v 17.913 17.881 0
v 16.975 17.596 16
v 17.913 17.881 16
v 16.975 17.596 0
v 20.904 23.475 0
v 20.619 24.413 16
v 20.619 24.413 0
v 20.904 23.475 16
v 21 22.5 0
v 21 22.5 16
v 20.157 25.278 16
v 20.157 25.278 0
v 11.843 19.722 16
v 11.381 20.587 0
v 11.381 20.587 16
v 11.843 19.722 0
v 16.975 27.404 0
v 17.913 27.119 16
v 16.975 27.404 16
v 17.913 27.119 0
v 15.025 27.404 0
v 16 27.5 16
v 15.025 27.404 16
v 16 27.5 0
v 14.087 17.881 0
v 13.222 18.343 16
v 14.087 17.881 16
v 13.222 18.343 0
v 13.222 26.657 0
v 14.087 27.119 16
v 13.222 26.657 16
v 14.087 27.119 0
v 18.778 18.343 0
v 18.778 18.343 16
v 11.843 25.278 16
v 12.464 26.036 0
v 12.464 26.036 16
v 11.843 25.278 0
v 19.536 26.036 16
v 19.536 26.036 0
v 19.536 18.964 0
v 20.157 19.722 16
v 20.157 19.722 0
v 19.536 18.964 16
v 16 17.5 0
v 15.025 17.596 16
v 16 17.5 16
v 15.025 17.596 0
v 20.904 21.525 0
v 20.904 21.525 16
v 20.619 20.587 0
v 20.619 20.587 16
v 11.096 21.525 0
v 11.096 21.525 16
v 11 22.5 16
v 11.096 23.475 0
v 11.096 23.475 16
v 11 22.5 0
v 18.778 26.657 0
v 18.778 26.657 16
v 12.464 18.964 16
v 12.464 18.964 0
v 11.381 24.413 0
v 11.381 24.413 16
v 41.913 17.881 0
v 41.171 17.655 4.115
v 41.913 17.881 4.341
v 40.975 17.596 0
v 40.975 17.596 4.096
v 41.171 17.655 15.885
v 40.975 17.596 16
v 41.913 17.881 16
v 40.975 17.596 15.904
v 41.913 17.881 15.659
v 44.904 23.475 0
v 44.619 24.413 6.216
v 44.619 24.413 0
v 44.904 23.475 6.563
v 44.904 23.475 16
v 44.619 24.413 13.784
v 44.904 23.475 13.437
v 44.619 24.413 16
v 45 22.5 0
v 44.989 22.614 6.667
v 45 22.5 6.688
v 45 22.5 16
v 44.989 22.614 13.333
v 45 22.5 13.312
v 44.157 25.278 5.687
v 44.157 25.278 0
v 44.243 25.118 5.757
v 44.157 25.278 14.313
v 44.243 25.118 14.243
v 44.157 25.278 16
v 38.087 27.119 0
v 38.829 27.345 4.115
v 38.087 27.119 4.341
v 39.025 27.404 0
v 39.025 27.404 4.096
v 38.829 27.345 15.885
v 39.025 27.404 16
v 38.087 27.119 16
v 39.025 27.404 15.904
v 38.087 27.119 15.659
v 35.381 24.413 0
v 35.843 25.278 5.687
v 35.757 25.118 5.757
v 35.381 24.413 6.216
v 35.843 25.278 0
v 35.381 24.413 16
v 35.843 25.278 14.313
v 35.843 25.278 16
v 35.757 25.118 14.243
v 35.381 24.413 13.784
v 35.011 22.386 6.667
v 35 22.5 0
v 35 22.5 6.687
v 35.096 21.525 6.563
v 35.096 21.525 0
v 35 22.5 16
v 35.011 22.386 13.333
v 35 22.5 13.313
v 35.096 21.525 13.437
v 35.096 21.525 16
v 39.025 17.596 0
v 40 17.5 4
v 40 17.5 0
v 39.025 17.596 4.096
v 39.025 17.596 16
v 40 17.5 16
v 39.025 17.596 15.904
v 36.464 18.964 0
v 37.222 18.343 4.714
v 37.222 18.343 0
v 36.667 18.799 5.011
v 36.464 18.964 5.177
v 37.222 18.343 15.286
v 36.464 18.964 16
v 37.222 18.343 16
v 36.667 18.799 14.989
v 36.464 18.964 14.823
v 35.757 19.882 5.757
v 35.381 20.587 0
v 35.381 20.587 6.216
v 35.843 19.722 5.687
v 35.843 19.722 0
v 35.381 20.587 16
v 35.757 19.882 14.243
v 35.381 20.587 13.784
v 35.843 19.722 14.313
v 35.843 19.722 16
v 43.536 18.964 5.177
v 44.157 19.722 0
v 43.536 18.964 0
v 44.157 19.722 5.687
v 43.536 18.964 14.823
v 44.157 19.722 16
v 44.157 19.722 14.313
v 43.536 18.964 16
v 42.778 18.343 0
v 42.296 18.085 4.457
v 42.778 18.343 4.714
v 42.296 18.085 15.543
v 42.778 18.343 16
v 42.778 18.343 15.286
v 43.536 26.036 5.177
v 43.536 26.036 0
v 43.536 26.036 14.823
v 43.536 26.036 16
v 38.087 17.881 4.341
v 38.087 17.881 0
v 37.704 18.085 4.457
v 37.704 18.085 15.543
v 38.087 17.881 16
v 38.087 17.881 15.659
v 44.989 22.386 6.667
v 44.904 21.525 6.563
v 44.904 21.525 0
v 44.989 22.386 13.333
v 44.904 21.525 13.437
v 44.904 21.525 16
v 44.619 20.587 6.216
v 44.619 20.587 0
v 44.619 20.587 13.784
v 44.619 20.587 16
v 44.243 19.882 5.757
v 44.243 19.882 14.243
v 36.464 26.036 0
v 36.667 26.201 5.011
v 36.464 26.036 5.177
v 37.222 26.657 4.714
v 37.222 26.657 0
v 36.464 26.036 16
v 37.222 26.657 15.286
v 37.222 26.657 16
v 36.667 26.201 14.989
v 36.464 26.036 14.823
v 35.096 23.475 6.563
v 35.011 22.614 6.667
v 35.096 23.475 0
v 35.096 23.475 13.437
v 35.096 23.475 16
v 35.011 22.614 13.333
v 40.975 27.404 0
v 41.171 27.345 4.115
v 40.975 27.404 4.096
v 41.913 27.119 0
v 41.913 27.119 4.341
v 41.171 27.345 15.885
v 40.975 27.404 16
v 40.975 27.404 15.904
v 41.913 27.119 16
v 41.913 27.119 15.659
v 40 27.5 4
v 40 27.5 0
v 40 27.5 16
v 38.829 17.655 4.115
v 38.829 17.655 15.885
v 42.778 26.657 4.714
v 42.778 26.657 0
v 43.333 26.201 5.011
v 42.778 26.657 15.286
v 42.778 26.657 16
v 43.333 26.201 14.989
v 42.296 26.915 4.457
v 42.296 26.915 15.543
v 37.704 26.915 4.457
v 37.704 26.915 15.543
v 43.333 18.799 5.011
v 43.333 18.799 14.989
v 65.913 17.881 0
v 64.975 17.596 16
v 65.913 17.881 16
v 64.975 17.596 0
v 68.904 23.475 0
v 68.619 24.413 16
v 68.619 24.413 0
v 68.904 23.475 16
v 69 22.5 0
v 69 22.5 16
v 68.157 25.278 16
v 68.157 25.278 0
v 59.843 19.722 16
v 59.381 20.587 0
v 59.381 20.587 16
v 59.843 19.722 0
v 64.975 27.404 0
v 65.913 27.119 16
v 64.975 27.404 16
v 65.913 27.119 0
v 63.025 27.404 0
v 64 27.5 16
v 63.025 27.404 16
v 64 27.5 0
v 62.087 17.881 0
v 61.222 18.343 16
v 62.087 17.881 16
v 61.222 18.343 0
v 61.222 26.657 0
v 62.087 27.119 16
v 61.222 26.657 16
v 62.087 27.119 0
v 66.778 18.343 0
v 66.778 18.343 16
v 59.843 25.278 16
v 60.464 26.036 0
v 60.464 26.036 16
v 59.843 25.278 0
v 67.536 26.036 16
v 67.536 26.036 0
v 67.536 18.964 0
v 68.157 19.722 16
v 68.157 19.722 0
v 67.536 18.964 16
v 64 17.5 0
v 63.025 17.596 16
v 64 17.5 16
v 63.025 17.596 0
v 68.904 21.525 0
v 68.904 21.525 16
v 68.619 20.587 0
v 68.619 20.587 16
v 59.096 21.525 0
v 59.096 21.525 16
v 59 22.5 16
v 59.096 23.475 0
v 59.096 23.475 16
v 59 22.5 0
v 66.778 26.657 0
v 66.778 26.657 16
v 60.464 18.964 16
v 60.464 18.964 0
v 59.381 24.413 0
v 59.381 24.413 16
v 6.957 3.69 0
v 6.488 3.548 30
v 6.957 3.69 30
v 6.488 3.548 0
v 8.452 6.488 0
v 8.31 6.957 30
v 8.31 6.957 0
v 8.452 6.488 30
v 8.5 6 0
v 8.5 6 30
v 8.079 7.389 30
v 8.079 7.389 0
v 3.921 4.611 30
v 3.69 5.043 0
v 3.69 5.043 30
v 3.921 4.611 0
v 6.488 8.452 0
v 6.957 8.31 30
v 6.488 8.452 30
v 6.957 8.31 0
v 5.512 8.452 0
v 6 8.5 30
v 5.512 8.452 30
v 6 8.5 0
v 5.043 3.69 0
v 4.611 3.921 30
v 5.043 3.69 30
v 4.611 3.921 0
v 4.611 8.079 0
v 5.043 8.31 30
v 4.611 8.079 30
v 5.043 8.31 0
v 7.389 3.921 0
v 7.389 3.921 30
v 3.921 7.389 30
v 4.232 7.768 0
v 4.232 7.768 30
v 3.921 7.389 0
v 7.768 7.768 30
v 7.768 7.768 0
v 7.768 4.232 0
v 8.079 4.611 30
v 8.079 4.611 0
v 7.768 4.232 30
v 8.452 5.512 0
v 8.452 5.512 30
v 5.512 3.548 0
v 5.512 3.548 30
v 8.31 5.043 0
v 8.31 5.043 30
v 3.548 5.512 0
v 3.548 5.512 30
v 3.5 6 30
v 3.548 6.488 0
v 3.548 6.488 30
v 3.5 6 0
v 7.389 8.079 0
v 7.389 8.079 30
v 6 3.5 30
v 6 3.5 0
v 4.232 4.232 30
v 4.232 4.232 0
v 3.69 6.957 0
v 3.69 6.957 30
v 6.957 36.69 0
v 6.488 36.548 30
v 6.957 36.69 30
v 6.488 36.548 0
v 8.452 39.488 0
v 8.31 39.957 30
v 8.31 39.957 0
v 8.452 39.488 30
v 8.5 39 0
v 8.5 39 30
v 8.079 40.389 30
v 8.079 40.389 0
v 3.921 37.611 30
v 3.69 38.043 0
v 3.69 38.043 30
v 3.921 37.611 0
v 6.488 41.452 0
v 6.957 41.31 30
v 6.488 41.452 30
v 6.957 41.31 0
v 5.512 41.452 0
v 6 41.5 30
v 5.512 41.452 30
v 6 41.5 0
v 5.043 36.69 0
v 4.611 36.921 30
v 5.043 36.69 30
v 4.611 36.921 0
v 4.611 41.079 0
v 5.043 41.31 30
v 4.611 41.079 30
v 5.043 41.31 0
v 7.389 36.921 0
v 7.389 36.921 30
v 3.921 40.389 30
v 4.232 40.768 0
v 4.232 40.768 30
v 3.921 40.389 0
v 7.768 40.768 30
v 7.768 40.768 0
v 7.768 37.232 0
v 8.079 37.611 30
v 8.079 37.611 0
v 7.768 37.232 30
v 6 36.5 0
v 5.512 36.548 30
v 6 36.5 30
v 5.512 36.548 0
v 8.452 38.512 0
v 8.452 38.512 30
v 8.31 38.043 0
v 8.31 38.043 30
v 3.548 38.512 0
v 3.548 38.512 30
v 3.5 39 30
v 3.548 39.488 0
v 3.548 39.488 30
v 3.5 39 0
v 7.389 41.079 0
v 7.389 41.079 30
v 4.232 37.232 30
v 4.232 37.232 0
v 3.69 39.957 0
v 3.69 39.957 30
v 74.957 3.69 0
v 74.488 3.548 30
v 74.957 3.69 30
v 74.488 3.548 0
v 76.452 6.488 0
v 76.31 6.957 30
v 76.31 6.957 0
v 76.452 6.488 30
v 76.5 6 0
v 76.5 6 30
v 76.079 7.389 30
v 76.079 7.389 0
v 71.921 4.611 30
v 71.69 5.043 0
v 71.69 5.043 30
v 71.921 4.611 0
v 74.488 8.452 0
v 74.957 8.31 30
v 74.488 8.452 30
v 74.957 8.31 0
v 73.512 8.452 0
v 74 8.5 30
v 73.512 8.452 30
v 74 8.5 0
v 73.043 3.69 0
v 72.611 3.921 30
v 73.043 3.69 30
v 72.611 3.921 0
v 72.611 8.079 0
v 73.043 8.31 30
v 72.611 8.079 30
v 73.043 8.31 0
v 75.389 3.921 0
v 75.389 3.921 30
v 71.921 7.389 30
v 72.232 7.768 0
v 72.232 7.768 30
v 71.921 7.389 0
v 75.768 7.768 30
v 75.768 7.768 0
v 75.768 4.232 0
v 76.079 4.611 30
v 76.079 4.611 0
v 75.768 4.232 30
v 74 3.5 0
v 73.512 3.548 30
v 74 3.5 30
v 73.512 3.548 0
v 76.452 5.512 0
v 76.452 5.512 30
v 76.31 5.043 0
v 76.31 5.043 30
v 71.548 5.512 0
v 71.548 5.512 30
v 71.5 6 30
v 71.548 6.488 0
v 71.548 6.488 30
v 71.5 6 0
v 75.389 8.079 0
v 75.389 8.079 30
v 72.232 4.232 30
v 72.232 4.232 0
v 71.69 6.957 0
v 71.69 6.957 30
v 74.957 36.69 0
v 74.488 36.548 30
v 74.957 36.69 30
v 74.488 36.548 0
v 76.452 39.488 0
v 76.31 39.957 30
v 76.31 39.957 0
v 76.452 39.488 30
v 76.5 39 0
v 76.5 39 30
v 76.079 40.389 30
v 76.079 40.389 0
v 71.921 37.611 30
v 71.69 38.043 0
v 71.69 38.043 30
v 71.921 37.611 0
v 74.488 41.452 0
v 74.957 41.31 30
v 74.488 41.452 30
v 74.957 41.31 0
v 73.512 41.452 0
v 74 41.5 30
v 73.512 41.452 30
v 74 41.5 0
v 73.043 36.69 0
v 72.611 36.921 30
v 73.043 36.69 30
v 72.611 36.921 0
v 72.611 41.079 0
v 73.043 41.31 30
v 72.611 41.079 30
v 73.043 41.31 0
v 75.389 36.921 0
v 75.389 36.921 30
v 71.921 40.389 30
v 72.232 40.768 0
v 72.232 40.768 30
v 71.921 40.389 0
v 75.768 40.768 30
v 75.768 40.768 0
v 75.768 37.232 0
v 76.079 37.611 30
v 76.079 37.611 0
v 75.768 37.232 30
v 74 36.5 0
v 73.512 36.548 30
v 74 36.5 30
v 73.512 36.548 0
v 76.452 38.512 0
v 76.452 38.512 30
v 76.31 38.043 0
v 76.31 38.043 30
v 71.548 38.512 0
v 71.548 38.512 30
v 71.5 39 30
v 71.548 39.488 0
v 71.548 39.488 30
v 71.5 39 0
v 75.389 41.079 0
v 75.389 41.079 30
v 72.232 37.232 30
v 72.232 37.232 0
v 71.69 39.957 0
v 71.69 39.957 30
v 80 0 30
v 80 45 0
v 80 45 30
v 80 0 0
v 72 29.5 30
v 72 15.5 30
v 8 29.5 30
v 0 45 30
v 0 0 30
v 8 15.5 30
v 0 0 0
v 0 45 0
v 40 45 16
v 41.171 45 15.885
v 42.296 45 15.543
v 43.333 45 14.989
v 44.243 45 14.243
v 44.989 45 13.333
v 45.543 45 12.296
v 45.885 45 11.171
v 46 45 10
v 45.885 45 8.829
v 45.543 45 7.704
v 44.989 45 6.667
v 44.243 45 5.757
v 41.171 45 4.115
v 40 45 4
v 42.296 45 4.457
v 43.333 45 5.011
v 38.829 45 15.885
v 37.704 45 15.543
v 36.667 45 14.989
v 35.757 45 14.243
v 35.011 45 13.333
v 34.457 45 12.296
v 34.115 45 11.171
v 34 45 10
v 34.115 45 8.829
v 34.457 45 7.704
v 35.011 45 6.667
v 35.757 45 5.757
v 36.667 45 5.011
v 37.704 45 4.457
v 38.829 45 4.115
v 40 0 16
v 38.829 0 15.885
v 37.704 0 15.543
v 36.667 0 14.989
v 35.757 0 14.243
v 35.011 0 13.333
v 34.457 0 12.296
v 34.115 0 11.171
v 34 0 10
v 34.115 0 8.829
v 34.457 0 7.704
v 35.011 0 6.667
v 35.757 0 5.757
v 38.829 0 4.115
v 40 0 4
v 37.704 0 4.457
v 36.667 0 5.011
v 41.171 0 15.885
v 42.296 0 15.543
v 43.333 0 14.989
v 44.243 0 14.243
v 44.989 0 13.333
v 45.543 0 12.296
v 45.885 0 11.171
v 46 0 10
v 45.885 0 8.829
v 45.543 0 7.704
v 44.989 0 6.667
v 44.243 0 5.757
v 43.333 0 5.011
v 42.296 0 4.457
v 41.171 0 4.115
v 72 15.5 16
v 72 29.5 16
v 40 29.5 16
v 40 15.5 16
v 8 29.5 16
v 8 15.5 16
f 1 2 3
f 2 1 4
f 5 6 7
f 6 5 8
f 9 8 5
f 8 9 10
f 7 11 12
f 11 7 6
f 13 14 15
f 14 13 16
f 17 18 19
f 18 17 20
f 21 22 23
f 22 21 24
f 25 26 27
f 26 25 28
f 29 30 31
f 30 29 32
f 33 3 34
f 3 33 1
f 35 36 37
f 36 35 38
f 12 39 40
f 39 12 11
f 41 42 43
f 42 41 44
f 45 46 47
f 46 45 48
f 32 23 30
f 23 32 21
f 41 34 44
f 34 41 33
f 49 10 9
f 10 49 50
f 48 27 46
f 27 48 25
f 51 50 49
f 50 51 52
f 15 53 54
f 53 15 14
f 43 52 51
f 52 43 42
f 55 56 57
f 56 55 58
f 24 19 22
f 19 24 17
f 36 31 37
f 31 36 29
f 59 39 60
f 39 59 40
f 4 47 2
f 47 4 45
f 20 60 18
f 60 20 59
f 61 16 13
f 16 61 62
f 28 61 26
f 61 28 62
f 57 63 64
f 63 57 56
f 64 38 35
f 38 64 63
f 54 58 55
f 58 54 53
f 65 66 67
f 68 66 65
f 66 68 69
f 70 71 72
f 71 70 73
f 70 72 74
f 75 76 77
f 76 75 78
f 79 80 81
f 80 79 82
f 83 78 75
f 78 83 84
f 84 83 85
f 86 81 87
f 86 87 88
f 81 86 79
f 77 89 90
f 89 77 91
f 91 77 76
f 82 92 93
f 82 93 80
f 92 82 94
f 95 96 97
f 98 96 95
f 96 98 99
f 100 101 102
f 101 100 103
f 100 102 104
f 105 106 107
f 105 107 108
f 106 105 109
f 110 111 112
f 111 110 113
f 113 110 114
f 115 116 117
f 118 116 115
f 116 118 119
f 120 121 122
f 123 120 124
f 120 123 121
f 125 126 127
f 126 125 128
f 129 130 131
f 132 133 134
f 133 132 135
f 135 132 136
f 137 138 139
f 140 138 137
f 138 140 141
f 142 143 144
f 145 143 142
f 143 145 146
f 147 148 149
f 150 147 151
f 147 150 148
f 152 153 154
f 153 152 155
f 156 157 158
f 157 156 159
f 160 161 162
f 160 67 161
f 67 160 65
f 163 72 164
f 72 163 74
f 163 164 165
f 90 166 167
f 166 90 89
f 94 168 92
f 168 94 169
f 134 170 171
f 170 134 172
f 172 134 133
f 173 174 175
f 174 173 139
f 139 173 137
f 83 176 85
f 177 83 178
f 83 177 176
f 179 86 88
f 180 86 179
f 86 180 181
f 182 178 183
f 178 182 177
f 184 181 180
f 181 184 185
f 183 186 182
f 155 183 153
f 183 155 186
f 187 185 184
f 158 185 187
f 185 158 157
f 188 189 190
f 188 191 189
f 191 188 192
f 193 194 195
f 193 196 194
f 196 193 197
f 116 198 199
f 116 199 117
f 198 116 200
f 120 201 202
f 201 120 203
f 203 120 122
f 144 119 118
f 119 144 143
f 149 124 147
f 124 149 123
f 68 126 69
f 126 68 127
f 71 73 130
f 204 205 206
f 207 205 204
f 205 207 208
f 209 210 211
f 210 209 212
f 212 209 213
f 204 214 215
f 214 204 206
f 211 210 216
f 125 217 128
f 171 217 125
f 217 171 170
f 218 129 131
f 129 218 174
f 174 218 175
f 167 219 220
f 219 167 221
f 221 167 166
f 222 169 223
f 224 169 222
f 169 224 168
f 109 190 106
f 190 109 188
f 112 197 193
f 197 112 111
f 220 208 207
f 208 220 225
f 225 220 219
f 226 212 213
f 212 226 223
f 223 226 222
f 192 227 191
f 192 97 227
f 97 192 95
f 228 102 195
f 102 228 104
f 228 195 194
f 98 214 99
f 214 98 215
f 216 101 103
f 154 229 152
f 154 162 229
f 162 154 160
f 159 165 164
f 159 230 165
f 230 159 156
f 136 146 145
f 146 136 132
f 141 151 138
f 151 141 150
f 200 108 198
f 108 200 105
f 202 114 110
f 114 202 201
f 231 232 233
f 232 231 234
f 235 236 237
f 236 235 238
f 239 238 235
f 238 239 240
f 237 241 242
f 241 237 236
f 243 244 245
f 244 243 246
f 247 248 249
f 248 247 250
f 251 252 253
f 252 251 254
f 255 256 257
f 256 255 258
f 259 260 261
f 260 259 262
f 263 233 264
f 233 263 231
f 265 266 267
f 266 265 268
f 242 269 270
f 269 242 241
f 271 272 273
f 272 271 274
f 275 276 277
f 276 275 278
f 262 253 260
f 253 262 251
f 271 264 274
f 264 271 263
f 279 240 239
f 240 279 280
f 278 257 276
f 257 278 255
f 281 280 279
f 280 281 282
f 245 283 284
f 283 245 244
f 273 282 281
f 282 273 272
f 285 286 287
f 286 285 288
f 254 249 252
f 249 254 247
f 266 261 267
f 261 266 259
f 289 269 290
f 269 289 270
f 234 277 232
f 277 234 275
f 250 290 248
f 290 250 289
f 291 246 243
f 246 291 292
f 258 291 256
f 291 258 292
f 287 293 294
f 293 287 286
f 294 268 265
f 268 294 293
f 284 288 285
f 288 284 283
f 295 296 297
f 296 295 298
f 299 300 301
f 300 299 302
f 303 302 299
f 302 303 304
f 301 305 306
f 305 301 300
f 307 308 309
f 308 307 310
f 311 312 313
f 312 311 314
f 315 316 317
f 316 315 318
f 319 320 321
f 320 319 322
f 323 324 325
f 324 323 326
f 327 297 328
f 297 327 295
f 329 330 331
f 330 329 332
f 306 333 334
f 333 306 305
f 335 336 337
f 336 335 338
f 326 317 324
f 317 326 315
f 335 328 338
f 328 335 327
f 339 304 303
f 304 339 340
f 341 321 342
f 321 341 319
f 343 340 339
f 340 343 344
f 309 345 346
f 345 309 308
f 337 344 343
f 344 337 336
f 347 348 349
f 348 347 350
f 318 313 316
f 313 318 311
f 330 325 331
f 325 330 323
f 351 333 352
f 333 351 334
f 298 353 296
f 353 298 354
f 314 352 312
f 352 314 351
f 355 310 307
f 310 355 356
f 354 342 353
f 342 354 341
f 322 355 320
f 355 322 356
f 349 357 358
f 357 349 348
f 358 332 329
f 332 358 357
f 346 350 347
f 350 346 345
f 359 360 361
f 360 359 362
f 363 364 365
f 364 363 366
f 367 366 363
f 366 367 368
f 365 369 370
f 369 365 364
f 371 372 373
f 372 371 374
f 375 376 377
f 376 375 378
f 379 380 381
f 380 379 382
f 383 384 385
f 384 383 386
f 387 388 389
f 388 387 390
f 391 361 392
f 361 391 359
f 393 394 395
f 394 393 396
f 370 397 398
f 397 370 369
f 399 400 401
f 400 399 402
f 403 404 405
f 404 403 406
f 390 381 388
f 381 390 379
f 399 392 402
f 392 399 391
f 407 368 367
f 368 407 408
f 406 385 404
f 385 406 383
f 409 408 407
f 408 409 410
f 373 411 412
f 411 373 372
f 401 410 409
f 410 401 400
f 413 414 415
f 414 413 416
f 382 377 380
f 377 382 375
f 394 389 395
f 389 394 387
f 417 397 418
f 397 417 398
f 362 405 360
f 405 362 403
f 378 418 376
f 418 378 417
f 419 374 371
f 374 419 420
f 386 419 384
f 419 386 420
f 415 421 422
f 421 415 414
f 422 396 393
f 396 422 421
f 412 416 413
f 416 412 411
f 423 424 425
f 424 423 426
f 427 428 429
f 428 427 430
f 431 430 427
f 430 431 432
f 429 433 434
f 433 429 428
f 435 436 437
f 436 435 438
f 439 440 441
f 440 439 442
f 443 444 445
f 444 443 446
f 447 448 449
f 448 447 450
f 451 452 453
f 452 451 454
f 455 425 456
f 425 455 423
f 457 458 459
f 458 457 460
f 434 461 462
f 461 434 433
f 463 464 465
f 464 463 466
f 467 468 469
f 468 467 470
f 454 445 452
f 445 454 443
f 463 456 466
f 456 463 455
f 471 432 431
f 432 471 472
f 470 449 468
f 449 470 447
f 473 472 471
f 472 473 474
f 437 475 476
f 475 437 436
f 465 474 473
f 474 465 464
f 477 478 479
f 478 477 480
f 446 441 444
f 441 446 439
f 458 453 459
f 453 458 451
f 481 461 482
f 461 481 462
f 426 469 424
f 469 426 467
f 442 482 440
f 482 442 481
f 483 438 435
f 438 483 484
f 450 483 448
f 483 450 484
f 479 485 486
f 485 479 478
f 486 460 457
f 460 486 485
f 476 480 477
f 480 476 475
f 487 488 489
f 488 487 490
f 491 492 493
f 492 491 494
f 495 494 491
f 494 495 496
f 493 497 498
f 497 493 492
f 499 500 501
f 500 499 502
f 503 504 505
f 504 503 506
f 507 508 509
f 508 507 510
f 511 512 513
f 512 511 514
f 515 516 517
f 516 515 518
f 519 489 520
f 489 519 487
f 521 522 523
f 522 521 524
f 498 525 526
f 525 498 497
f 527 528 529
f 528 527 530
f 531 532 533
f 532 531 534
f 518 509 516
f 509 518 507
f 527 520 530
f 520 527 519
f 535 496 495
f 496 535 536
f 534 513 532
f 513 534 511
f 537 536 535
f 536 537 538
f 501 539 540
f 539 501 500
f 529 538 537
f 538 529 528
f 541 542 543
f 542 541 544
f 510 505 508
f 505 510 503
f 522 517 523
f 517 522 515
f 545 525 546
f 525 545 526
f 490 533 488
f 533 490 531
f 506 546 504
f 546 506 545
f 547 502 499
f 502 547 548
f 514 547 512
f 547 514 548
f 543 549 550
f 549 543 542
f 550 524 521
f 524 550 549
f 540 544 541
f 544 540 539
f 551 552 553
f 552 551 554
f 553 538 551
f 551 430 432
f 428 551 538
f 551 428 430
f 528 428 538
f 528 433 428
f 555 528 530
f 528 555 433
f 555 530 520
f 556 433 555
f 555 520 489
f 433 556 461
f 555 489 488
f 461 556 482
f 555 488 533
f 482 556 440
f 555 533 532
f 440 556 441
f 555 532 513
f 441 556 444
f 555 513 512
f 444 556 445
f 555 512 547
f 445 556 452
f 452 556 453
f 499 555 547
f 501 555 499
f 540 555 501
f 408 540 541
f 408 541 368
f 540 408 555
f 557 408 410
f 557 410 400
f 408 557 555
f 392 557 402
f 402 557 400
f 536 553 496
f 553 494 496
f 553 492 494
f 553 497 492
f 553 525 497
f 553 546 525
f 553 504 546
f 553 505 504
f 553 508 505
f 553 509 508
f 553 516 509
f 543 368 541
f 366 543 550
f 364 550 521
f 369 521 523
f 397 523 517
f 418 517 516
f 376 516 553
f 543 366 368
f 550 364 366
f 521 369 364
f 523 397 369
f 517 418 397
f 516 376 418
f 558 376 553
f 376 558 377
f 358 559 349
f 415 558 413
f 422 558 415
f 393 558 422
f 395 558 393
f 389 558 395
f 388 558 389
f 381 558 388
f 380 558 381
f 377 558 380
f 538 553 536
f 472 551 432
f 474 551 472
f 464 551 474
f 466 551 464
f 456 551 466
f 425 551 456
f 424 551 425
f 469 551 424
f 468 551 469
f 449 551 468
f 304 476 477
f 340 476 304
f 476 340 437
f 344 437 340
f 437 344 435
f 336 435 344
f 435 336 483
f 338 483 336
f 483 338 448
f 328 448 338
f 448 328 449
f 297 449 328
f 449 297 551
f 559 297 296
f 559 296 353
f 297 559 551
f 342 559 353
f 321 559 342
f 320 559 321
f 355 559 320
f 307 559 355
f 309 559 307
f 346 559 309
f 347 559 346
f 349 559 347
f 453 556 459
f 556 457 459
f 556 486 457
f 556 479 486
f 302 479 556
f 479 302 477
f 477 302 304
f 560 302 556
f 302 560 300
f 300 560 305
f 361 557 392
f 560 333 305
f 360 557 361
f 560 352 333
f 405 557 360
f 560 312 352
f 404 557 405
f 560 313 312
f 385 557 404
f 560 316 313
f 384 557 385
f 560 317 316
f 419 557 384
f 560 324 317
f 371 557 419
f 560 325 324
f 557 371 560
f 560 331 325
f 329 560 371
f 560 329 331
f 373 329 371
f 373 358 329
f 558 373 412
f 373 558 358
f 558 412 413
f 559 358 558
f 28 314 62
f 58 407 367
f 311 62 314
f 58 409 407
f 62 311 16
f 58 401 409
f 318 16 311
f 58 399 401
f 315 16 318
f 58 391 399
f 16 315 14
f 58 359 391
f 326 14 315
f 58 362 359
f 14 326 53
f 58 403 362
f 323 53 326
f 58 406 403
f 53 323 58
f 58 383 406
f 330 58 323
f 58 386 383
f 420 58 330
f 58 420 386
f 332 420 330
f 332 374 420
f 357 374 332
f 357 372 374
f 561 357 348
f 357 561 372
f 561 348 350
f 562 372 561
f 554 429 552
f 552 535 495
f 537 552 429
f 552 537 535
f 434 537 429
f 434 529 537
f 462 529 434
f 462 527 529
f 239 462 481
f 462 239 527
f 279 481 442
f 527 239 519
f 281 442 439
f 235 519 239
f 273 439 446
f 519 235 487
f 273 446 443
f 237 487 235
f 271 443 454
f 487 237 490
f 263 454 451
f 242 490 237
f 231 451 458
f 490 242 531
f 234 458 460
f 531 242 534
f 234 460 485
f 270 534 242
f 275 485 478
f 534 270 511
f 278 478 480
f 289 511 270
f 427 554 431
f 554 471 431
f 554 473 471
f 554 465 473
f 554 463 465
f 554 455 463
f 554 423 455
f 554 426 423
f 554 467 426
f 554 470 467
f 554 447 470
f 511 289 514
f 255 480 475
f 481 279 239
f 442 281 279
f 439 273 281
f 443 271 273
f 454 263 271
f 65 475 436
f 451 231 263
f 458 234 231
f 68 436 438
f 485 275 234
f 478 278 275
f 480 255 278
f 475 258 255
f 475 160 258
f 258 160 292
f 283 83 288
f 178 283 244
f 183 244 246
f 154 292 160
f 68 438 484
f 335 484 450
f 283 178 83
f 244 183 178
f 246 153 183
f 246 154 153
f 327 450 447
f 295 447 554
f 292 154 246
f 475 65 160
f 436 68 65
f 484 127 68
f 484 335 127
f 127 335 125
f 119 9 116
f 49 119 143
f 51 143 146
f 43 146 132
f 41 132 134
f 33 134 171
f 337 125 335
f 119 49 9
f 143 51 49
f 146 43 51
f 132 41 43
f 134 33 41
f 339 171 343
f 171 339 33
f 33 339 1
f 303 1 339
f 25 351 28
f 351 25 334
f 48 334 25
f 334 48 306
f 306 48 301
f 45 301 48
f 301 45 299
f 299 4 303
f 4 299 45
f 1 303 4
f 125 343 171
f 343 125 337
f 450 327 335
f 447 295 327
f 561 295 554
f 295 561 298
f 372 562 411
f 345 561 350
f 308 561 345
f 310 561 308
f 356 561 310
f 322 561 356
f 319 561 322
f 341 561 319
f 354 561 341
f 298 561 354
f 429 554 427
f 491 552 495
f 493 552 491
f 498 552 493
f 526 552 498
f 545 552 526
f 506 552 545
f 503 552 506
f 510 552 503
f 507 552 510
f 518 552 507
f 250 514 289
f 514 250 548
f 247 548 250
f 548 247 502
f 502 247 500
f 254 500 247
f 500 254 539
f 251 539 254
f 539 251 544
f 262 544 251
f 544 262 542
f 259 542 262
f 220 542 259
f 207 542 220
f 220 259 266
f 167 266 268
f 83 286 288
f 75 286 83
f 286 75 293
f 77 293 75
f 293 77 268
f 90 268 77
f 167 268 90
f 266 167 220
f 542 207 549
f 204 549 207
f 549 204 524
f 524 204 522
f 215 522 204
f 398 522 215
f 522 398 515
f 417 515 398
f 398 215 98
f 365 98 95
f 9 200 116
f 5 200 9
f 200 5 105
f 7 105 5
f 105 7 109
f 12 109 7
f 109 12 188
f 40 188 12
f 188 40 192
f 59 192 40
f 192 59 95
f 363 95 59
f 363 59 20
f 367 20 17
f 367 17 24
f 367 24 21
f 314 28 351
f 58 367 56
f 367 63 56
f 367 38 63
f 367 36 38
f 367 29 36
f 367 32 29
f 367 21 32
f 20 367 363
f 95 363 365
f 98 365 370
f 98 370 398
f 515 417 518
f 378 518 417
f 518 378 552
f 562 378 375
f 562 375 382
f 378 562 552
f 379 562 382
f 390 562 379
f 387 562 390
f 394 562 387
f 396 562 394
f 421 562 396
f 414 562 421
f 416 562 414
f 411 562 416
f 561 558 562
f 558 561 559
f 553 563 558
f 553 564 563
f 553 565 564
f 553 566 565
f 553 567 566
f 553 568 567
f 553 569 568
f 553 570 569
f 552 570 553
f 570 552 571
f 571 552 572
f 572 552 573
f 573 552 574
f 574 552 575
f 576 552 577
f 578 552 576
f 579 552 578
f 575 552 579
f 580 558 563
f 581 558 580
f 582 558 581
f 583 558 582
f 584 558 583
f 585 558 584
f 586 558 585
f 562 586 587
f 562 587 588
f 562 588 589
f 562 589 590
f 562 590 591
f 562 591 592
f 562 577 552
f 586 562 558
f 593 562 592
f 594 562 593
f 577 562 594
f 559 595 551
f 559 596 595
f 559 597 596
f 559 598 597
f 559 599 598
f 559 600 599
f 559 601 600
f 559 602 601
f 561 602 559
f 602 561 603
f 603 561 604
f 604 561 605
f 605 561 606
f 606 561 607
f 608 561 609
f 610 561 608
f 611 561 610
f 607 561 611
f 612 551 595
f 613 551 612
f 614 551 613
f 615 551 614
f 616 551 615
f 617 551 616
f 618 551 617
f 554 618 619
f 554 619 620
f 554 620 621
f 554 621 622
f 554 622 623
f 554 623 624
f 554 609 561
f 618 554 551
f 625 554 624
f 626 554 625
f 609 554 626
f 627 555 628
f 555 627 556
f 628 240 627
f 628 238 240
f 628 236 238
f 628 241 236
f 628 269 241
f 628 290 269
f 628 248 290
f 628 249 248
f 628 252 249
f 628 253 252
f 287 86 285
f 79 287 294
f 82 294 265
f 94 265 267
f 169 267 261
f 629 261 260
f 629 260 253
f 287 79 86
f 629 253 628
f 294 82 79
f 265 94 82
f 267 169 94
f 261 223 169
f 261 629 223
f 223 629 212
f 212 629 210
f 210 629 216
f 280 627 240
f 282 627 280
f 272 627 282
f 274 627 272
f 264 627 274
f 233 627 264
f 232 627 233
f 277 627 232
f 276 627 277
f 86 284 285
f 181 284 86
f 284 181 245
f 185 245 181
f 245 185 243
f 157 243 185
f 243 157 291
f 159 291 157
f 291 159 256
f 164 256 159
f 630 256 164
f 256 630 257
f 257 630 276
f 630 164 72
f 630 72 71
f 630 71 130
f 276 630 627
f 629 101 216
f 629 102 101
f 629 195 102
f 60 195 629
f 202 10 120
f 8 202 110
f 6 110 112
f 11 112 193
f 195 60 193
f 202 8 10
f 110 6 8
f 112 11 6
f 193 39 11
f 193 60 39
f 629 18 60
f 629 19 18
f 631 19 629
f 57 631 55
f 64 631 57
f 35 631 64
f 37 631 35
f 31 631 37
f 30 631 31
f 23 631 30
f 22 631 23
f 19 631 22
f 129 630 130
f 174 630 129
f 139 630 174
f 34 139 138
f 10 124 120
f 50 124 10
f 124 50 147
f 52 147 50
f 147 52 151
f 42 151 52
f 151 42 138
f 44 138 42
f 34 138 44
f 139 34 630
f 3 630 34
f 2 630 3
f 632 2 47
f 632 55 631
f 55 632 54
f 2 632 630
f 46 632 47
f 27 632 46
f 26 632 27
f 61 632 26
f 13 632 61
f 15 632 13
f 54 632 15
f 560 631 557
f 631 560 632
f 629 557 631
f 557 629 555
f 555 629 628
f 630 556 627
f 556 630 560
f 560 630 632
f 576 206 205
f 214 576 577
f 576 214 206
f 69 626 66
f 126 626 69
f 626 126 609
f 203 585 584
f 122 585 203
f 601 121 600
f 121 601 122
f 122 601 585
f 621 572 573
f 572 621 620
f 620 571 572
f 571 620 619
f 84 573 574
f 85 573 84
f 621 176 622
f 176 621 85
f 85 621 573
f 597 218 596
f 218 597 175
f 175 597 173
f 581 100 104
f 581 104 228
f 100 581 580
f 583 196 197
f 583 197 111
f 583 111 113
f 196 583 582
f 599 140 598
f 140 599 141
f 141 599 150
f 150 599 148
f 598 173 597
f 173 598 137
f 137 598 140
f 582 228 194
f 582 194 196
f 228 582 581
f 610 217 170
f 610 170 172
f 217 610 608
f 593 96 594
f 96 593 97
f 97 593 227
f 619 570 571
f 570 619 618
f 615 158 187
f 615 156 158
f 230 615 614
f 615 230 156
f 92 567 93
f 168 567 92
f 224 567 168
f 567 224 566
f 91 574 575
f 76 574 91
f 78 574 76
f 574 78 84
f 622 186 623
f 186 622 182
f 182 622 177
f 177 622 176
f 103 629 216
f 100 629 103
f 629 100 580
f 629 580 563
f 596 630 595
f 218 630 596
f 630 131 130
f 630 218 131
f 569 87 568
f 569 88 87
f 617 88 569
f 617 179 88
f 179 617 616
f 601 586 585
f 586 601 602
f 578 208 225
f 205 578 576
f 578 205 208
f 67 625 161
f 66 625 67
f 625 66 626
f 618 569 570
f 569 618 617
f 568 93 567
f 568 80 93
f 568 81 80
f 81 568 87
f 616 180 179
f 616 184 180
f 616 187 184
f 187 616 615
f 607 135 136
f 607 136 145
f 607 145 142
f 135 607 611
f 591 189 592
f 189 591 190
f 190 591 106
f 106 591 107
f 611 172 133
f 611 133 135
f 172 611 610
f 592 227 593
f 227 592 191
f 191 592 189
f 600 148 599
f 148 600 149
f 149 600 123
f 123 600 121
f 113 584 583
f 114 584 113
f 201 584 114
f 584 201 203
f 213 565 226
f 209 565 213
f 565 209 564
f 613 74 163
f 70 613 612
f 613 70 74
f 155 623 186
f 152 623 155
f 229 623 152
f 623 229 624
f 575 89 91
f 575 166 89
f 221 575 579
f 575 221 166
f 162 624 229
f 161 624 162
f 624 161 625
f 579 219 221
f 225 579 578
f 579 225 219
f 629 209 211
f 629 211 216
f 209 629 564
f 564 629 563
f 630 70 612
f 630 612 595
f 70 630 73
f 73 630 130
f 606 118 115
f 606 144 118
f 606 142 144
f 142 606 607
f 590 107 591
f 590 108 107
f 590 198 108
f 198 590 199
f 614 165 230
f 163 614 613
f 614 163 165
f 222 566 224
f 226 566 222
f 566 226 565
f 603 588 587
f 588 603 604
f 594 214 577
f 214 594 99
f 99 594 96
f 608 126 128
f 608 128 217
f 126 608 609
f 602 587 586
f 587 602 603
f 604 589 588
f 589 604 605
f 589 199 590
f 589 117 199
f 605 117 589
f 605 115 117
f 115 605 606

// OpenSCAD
$fn = 32;

// ----------------------------------------------------------------------
// Manifold block: side_outlet manifold
// ----------------------------------------------------------------------

// --- parameters (mm) ---
block_l = 80;             // block length, X
block_w = 45;             // block width, Y
block_h = 30;             // block height, Z
port_d = 10;              // port bore diameter
port_pitch = 24;          // port pitch along X
gallery_d = 14;           // top gallery width, Y
gallery_depth = 14;       // gallery pocket depth
wall_p = 8;               // gallery end wall thickness, X
mnt_d = 5;                // mounting hole diameter
mnt_in = 6;               // mounting hole inset from the edges
out_d = 12;               // outlet bore diameter
out_z = 10;               // outlet axis height

n_ports = 3;  // ports in the row
port_x0 = (block_l - (n_ports - 1) * port_pitch) / 2;  // first port X

difference() {
  cube([block_l, block_w, block_h]);
  for (i = [0 : n_ports - 1])
    translate([port_x0 + i * port_pitch, block_w / 2, -1])
      cylinder(h = block_h + 2, d = port_d);
  translate([wall_p, block_w / 2 - gallery_d / 2, block_h - gallery_depth])
    cube([block_l - 2 * wall_p, gallery_d, gallery_depth + 1]);
  for (cx = [mnt_in, block_l - mnt_in])
    for (cy = [mnt_in, block_w - mnt_in])
      translate([cx, cy, -1]) cylinder(h = block_h + 2, d = mnt_d);
  translate([block_l / 2, -1, out_z]) rotate([-90, 0, 0])
    cylinder(h = block_w + 2, d = out_d);
}
